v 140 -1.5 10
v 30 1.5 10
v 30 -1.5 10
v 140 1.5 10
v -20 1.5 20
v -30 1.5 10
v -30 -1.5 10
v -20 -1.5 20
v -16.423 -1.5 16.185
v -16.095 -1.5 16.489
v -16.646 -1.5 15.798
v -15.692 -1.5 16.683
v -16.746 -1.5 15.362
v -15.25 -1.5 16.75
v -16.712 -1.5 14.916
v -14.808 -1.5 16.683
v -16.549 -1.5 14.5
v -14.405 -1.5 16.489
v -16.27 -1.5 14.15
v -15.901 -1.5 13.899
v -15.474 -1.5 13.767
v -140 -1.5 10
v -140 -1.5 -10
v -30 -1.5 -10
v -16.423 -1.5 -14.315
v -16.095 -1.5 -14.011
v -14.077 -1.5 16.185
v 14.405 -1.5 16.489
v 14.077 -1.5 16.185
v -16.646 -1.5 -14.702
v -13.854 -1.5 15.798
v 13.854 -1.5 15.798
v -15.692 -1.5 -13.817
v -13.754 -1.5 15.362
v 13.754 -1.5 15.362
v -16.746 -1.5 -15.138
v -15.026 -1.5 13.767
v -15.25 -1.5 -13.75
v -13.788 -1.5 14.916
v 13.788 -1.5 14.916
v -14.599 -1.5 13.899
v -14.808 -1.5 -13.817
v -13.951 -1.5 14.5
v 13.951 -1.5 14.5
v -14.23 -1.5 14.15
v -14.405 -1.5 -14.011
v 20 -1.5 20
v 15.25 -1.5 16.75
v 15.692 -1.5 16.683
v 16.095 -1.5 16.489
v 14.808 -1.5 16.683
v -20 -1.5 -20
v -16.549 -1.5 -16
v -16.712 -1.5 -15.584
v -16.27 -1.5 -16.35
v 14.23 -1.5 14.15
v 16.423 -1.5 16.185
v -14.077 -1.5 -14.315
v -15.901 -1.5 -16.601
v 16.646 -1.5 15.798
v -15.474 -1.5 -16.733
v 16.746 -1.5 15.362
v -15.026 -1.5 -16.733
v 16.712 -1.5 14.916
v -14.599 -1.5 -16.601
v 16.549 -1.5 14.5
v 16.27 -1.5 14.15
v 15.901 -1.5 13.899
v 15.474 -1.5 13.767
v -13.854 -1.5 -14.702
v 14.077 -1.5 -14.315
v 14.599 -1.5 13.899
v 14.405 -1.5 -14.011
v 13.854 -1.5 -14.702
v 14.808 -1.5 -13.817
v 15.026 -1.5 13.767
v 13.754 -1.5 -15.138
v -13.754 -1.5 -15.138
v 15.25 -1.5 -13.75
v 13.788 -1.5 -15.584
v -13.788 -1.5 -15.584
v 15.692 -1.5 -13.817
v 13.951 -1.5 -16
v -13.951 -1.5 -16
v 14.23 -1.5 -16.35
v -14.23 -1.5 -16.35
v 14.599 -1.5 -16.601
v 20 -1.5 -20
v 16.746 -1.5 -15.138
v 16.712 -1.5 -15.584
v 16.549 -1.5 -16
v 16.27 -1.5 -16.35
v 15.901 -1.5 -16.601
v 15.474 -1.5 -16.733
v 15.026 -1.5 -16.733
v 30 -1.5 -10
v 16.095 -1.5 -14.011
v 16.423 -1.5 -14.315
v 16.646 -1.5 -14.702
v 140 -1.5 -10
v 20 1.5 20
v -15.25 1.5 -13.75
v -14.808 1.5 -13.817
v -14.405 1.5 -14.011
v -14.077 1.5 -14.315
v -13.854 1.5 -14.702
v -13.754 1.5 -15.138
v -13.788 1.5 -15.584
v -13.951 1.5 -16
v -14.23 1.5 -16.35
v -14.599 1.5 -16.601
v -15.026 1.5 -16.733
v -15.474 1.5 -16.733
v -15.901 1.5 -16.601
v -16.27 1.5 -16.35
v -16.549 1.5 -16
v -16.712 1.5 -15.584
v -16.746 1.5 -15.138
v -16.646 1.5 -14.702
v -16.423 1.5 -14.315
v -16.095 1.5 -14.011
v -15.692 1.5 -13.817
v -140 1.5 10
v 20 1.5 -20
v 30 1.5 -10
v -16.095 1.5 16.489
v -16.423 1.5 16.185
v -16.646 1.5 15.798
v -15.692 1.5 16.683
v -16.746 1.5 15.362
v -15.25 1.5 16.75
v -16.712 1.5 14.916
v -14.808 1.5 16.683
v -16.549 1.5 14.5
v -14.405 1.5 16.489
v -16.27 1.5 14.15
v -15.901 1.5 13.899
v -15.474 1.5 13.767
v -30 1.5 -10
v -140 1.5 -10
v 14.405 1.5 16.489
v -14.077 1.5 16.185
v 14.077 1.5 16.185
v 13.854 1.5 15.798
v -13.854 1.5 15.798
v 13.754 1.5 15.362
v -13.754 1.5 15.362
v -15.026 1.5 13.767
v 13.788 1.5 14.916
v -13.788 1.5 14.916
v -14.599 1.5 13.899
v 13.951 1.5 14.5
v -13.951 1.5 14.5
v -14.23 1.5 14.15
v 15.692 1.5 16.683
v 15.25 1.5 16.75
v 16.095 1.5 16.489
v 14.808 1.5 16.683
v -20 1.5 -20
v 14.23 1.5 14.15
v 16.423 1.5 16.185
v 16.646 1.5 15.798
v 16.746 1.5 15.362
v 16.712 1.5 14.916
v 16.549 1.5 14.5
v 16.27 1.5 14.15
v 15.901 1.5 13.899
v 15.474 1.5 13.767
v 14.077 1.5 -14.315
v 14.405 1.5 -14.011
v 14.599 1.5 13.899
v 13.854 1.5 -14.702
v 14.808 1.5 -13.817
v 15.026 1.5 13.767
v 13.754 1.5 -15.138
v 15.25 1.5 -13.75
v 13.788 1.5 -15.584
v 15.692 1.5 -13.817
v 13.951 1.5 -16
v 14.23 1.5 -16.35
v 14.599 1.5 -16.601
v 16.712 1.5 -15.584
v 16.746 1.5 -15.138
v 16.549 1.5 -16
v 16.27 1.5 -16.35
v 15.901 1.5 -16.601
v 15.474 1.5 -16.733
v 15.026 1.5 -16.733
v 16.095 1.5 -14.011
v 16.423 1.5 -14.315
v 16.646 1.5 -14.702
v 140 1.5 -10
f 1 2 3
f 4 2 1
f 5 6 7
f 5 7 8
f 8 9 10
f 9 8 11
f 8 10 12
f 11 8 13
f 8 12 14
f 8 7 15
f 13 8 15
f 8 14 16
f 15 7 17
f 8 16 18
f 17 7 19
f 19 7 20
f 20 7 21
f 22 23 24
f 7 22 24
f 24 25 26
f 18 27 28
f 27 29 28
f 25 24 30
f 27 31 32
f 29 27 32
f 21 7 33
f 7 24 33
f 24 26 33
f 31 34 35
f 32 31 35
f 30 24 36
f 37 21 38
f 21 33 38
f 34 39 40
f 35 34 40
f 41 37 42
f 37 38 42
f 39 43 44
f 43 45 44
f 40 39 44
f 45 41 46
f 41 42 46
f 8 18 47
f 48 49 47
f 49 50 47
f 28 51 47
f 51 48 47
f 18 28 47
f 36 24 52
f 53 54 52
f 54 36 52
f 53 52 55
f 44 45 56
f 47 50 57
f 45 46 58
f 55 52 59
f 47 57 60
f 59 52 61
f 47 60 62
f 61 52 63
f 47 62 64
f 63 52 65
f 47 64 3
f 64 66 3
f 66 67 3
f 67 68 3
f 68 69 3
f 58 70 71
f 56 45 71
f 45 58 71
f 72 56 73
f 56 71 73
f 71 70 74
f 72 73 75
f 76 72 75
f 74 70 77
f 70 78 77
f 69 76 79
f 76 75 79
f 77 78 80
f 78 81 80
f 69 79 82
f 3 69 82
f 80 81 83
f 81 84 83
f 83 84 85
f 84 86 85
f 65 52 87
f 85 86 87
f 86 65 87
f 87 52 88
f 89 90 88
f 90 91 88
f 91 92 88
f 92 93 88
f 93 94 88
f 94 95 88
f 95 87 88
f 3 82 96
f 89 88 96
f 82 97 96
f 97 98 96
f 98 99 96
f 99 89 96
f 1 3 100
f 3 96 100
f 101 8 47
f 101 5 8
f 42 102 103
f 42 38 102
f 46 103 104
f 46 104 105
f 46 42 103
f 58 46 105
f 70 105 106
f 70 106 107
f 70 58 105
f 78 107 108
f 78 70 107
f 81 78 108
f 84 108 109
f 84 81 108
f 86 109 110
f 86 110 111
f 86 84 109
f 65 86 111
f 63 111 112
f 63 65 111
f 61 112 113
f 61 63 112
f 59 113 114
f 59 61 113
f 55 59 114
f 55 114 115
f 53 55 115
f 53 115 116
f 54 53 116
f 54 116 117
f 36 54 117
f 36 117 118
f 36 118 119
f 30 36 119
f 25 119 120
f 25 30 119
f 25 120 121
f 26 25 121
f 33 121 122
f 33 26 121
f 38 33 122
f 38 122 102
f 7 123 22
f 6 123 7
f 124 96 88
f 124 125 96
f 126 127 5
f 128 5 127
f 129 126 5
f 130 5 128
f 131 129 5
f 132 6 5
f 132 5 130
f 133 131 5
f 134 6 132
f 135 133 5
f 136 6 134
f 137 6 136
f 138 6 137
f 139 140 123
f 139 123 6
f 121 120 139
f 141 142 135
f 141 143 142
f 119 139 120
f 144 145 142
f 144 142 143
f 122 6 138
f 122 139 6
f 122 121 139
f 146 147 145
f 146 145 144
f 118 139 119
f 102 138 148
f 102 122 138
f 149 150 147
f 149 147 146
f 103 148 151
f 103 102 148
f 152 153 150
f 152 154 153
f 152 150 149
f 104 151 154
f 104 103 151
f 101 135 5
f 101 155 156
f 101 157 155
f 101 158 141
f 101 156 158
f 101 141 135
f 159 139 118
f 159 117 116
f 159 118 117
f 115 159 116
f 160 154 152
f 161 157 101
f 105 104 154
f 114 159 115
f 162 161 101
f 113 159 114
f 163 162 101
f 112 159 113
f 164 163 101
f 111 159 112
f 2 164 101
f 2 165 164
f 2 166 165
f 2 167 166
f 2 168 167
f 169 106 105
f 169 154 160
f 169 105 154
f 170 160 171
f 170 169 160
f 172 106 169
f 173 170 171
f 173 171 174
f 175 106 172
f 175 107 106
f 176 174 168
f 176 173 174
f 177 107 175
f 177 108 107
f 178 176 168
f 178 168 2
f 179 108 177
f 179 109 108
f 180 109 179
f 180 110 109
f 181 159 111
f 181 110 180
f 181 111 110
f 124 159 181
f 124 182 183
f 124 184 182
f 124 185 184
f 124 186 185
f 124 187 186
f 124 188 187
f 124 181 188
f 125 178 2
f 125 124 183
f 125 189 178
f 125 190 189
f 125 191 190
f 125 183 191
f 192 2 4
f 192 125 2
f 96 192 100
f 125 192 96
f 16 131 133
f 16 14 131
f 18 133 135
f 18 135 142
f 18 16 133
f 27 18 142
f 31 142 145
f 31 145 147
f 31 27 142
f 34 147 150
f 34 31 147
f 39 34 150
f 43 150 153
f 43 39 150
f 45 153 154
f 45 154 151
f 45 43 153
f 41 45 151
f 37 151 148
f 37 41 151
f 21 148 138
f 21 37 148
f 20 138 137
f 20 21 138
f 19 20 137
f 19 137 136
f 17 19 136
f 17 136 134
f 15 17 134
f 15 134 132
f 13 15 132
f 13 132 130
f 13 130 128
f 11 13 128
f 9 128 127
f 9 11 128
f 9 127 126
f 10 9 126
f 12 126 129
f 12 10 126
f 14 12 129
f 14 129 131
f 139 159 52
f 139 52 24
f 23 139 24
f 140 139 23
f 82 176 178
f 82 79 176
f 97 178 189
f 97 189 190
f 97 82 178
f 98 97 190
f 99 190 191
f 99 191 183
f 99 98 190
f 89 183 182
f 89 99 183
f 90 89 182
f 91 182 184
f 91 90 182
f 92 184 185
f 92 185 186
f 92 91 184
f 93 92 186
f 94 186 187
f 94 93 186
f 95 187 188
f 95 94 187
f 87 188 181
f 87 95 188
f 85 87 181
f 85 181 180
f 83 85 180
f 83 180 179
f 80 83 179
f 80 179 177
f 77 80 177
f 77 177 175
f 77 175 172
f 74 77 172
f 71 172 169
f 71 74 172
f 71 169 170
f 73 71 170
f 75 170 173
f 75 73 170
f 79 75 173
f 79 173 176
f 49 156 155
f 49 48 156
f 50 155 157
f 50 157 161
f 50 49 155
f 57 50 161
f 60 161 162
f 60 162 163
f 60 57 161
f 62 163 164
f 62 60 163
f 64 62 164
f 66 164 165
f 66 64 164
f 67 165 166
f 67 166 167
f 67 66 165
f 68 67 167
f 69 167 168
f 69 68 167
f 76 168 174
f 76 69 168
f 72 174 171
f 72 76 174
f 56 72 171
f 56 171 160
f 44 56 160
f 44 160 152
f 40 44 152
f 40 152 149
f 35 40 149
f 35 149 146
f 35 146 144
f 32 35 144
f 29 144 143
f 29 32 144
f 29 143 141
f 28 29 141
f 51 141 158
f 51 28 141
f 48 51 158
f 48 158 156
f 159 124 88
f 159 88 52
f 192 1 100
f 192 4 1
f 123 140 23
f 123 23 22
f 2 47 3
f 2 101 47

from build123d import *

# Parameters (mm, degrees)
SKETCH1_R           = 1.5
BOSS_EXTRUDE1_DEPTH = 1.5


with BuildPart() as part:
    # Sketch1 → Boss-Extrude1 (new, symmetric)
    with BuildSketch(Plane(origin=(0, 0, 0), x_dir=(1, 0, 0), z_dir=(0, 1, 0))):
        Polygon((30, 10), (20, 20), (-20, 20), (-30, 10), (-140, 10), (-140, -10), (-30, -10), (-20, -20), (20, -20), (30, -10), (140, -10), (140, 10), align=None)
        with Locations(Location((-15.25, -15.25, 0), (0, 0, 270))):
            Circle(SKETCH1_R, mode=Mode.SUBTRACT)
        with Locations(Location((15.25, -15.25, 0), (0, 0, 270))):
            Circle(SKETCH1_R, mode=Mode.SUBTRACT)
        with Locations(Location((-15.25, 15.25, 0), (0, 0, 270))):
            Circle(SKETCH1_R, mode=Mode.SUBTRACT)
        with Locations(Location((15.25, 15.25, 0), (0, 0, 270))):
            Circle(SKETCH1_R, mode=Mode.SUBTRACT)
    extrude(amount=BOSS_EXTRUDE1_DEPTH, both=True)


solid = part.part
